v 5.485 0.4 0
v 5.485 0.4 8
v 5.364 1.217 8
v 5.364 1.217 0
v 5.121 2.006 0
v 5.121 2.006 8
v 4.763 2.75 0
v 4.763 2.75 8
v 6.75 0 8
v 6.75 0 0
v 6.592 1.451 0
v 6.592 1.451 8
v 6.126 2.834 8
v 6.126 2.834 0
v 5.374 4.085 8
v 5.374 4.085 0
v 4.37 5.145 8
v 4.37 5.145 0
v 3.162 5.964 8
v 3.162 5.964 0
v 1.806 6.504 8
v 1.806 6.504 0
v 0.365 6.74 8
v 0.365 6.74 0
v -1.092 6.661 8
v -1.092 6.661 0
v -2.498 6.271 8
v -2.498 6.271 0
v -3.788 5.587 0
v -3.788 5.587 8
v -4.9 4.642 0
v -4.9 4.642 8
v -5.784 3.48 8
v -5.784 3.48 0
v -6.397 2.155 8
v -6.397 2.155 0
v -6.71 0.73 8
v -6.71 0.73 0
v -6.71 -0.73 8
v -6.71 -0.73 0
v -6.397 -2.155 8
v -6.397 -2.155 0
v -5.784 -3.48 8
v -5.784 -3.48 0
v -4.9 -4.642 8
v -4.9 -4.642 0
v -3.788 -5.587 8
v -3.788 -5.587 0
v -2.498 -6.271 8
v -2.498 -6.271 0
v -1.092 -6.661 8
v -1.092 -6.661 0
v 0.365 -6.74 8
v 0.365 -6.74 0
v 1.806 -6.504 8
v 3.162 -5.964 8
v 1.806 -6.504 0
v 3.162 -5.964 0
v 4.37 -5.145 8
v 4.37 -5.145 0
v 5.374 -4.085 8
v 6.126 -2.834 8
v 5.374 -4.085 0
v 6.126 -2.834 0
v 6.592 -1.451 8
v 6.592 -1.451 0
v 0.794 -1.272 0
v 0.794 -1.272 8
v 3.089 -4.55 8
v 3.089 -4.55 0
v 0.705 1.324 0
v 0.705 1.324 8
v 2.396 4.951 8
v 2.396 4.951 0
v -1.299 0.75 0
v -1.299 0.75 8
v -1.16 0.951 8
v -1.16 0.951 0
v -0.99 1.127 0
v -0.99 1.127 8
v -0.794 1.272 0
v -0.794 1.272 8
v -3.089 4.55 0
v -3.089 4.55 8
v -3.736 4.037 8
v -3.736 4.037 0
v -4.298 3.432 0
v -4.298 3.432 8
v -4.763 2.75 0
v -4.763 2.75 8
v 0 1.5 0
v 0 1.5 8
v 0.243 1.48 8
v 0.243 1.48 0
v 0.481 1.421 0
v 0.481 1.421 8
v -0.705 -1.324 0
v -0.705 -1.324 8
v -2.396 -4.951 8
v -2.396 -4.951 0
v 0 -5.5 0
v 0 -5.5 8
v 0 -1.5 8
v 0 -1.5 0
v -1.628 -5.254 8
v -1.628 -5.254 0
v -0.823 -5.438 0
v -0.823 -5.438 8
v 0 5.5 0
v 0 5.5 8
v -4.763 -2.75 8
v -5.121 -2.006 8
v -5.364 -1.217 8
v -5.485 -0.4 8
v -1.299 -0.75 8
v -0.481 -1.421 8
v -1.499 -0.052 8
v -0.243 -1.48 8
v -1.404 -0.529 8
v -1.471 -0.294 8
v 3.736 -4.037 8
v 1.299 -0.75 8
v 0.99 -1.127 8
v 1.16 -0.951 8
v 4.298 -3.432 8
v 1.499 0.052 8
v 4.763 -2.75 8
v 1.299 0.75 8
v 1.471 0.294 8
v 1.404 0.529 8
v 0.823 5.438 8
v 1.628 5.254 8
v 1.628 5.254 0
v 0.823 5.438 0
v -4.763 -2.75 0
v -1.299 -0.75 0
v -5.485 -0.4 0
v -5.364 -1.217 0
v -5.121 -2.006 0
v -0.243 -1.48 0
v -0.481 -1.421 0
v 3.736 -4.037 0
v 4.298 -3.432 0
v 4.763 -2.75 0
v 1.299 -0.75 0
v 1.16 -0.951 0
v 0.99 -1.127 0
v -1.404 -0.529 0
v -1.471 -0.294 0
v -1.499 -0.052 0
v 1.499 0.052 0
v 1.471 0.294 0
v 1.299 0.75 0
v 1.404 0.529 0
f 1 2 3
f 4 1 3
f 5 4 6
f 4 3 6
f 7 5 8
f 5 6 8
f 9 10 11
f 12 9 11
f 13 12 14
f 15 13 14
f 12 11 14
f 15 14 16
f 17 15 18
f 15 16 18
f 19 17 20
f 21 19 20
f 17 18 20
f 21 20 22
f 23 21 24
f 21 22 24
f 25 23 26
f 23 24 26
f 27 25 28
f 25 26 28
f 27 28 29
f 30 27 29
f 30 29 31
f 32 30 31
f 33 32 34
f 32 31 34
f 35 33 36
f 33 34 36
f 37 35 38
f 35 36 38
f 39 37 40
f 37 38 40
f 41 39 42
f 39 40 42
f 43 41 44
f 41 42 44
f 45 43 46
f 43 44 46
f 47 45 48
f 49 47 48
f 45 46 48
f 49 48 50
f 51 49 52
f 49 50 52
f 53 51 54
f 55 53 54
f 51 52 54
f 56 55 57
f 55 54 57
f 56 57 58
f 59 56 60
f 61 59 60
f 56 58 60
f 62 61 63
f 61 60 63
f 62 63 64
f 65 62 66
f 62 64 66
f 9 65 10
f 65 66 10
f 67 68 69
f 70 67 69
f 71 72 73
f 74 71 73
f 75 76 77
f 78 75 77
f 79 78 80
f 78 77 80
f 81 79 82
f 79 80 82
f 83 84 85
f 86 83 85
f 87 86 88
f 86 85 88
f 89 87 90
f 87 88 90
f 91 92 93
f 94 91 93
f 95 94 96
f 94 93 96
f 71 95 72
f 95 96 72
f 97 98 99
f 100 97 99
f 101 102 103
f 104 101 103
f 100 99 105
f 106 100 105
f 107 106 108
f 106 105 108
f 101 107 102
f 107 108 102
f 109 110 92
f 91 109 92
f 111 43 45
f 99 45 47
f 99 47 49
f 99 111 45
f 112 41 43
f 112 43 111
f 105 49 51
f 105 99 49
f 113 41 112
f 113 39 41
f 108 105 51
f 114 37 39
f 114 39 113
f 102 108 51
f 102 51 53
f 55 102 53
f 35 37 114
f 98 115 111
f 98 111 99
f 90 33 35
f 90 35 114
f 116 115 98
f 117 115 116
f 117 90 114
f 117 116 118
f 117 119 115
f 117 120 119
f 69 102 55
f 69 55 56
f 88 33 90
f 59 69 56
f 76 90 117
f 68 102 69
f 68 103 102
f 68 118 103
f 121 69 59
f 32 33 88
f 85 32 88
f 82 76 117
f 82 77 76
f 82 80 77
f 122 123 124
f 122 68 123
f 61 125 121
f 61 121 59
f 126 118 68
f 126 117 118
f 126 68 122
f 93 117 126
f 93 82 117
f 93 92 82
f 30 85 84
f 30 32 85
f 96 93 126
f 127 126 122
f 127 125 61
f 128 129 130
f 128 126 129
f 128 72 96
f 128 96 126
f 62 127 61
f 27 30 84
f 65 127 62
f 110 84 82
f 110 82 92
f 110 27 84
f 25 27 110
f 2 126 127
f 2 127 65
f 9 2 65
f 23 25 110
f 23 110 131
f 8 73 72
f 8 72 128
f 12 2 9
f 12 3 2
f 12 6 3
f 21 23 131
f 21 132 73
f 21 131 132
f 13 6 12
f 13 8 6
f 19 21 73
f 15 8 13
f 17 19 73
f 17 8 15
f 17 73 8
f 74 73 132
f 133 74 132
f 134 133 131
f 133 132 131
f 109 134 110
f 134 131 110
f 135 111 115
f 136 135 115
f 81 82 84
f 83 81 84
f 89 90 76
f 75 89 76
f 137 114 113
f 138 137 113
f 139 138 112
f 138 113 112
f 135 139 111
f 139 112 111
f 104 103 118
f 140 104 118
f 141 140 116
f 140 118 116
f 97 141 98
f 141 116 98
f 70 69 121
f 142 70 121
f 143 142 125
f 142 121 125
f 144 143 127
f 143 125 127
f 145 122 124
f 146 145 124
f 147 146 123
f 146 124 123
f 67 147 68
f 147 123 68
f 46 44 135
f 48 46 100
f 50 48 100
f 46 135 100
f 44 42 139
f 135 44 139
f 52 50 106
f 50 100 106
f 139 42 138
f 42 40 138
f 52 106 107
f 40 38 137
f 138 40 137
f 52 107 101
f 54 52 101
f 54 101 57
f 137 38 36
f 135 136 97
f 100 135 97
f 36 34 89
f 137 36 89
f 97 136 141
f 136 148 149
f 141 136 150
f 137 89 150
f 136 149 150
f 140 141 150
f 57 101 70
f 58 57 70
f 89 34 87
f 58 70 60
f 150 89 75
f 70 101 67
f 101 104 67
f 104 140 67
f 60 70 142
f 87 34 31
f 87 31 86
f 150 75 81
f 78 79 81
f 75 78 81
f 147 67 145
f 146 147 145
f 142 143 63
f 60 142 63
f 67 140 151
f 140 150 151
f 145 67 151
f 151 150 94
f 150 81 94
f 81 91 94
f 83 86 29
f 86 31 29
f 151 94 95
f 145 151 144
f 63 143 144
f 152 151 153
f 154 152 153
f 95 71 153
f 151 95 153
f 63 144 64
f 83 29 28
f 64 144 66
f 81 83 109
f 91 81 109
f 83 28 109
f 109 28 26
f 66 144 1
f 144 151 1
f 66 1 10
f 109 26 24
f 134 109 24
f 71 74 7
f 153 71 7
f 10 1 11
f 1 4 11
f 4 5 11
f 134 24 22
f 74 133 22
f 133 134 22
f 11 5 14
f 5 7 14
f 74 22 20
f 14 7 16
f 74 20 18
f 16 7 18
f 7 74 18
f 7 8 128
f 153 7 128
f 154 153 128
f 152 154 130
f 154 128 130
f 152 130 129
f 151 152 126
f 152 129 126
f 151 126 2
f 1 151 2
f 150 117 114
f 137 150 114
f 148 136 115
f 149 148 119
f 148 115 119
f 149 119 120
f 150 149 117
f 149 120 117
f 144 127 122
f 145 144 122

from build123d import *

# Parameters (mm, degrees)
F0_R     = 6.75
F1_DEPTH = 8
F3_DEPTH = 25


with BuildPart() as f1:
    # F0 (on Top) → F1 (new body)
    with BuildSketch(Plane.XY):
        Circle(F0_R)
    extrude(amount=F1_DEPTH)

    # F2 (on face) → F3 (cut)
    with BuildSketch(Plane.XY.offset(8)):
        with BuildLine():
            ThreePointArc((0, 1.5), (0.363208, 1.455362), (0.704799, 1.324107))
            Line((0.704799, 1.324107), (2.395915, 4.950716))
            ThreePointArc((2.395915, 4.950716), (1.229036, 5.360921), (0, 5.5))
            Line((0, 5.5), (0, 1.5))
        make_face()
        with BuildLine():
            ThreePointArc((1.299038, 0.75), (1.441985, 0.413134), (1.499109, 0.051679))
            Line((1.499109, 0.051679), (5.485404, 0.400435))
            ThreePointArc((5.485404, 0.400435), (5.257212, 1.616084), (4.76314, 2.75))
            Line((4.76314, 2.75), (1.299038, 0.75))
        make_face()
        with BuildLine():
            Line((4.76314, -2.75), (1.299038, -0.75))
            ThreePointArc((1.299038, -0.75), (1.078777, -1.042229), (0.79431, -1.272427))
            Line((0.79431, -1.272427), (3.089488, -4.550281))
            ThreePointArc((3.089488, -4.550281), (4.028175, -3.744837), (4.76314, -2.75))
        make_face()
        with BuildLine():
            Line((0, -5.5), (0, -1.5))
            ThreePointArc((0, -1.5), (-0.363208, -1.455362), (-0.704799, -1.324107))
            Line((-0.704799, -1.324107), (-2.395915, -4.950716))
            ThreePointArc((-2.395915, -4.950716), (-1.229036, -5.360921), (0, -5.5))
        make_face()
        with BuildLine():
            Line((-4.76314, -2.75), (-1.299038, -0.75))
            ThreePointArc((-1.299038, -0.75), (-1.441985, -0.413134), (-1.499109, -0.051679))
            Line((-1.499109, -0.051679), (-5.485404, -0.400435))
            ThreePointArc((-5.485404, -0.400435), (-5.257212, -1.616084), (-4.76314, -2.75))
        make_face()
        with BuildLine():
            ThreePointArc((-1.299038, 0.75), (-1.078777, 1.042229), (-0.79431, 1.272427))
            Line((-0.79431, 1.272427), (-3.089488, 4.550281))
            ThreePointArc((-3.089488, 4.550281), (-4.028175, 3.744837), (-4.76314, 2.75))
            Line((-4.76314, 2.75), (-1.299038, 0.75))
        make_face()
    extrude(amount=-F3_DEPTH, mode=Mode.SUBTRACT)


solid = f1.part
